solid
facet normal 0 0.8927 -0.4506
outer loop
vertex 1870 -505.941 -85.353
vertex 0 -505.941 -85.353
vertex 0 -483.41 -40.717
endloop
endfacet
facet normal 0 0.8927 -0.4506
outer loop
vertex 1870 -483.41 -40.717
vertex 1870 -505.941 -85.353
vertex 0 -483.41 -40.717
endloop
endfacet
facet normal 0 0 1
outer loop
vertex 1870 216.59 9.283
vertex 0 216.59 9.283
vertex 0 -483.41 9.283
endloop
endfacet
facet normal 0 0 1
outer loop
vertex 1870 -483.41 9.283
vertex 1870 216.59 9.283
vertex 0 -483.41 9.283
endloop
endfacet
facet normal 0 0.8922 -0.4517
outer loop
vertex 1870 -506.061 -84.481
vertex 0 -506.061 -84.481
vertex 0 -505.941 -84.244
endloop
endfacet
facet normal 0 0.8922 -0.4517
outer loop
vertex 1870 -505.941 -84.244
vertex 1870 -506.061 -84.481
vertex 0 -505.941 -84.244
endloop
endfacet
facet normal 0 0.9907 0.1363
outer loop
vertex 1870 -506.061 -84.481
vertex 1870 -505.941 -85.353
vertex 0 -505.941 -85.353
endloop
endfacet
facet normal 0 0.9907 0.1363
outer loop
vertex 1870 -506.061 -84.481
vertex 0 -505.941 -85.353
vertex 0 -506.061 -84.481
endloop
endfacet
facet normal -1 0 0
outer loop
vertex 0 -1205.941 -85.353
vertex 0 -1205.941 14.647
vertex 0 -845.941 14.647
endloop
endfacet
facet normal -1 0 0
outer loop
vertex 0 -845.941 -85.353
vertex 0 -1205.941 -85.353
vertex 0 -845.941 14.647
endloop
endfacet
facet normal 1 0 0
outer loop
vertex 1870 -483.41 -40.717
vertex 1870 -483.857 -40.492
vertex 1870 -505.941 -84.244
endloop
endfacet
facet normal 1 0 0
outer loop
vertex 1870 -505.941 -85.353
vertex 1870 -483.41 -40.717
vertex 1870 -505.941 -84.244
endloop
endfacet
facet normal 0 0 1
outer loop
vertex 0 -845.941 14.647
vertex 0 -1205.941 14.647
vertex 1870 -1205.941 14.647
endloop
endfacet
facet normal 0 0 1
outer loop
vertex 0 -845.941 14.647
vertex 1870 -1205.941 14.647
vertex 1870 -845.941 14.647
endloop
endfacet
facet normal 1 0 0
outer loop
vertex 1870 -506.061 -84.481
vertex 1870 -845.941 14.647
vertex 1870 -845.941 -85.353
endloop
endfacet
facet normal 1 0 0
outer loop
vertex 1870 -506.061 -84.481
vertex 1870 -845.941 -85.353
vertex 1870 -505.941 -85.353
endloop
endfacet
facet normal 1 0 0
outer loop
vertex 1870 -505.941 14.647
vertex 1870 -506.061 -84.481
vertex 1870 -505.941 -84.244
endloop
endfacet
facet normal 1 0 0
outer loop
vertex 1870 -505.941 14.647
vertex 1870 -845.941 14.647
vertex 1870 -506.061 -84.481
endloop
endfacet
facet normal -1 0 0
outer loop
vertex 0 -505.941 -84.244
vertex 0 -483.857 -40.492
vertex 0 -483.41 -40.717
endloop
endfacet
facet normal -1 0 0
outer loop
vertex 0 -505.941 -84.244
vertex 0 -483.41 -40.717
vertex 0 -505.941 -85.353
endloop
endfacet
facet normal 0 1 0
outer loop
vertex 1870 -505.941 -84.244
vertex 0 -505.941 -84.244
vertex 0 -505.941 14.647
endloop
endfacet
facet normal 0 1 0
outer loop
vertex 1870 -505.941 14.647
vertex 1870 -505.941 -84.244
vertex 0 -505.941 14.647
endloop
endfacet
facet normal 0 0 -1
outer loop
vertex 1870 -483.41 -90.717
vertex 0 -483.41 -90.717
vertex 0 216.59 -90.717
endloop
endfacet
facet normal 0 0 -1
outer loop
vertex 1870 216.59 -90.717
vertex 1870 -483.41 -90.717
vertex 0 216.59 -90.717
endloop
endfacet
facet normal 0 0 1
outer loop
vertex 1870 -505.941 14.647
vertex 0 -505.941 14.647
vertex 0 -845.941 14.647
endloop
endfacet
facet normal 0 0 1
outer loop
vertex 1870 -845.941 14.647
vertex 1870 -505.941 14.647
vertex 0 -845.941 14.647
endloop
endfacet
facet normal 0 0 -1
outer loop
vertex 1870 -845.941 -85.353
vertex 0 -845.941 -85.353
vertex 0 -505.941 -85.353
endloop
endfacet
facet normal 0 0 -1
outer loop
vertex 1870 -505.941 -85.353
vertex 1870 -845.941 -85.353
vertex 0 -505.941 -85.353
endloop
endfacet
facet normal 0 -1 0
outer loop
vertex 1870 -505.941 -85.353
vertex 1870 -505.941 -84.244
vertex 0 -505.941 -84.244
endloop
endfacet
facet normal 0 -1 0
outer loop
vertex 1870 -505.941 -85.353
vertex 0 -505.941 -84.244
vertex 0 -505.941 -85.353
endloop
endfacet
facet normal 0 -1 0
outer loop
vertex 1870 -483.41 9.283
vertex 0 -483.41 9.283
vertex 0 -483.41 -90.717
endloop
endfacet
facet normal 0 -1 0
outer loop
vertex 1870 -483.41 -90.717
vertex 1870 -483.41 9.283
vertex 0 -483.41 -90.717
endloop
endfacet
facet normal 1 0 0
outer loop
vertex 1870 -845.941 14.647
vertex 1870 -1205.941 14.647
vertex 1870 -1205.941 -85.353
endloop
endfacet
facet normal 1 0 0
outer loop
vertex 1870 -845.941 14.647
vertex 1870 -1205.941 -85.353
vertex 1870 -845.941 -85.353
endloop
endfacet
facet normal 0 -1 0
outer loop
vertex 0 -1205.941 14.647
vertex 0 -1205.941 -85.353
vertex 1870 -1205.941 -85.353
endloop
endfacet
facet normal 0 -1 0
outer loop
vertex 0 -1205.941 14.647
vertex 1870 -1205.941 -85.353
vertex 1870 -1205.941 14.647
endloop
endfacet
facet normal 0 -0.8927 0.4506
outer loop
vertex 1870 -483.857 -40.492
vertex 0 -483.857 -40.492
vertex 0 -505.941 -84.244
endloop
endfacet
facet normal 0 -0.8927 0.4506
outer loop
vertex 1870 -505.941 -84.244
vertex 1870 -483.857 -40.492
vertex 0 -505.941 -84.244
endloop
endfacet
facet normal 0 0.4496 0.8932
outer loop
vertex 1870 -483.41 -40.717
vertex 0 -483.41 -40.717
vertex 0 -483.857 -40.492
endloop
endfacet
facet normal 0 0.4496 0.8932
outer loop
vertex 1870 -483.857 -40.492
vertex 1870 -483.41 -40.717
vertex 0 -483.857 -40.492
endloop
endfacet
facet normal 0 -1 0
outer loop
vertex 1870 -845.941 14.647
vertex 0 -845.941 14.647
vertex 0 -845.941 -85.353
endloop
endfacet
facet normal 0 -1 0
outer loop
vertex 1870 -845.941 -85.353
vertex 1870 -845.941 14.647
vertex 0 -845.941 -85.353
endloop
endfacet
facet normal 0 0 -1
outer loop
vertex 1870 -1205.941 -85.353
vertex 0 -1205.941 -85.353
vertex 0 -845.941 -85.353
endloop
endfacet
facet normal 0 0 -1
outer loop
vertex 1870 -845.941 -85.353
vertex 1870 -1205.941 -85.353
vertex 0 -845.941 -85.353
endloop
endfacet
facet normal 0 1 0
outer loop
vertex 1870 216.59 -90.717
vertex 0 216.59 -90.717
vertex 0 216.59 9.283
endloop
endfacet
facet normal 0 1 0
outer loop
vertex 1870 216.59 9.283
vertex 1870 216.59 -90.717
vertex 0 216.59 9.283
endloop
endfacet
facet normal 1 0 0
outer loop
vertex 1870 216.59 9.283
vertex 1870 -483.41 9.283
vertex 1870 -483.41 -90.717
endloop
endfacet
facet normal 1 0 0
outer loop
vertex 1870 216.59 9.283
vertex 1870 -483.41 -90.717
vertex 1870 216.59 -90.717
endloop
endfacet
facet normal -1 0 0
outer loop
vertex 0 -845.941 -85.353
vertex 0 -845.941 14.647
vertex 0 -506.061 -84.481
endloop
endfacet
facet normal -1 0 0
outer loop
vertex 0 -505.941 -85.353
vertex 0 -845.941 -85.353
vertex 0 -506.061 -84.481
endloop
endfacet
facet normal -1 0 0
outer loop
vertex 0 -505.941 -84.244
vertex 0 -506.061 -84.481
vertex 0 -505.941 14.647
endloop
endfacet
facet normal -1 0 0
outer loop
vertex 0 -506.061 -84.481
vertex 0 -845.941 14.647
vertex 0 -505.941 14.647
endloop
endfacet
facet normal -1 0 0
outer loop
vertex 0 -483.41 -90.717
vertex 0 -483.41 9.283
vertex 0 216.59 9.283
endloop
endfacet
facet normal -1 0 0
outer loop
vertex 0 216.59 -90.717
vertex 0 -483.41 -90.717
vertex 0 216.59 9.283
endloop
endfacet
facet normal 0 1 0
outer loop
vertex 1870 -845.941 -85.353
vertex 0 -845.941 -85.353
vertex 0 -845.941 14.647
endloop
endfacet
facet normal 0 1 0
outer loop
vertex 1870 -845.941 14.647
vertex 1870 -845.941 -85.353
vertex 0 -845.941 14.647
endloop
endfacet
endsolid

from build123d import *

# Parameters (mm, degrees)
F0_W     = 360
F0_H     = 100
F1_DEPTH = 1870
F2_DEPTH = 1870
F3_DEPTH = 1870
F4_DEPTH = 1870


with BuildPart() as f1:
    # F0 (on Right) → F1 (new body)
    with BuildSketch(Plane.YZ):
        with Locations((-1025.940814, -35.353306)):
            Rectangle(F0_W, F0_H)
    extrude(amount=F1_DEPTH)


with BuildPart() as f2:
    # F0 (on Right) → F2 (new body)
    with BuildSketch(Plane.YZ):
        Polygon((-505.940814, 14.646694), (-845.940814, 14.646694), (-845.940814, -85.353306), (-505.940814, -85.353306), (-506.060747, -84.481298), (-505.940814, -84.243691), align=None)
    extrude(amount=F2_DEPTH)


with BuildPart() as f3:
    # F0 (on Right) → F3 (new body)
    with BuildSketch(Plane.YZ):
        Polygon((-483.410478, 9.282822), (-483.410478, -40.717178), (-483.410478, -90.717178), (216.589522, -90.717178), (216.589522, 9.282822), align=None)
    extrude(amount=F3_DEPTH)


with BuildPart() as f4:
    # F0 (on Right) → F4 (new body)
    with BuildSketch(Plane.YZ):
        Polygon((-505.940814, -84.243691), (-505.940814, -85.353306), (-483.410478, -40.717178), (-483.856839, -40.491875), align=None)
    extrude(amount=F4_DEPTH)


solid = Compound([f1.part, f2.part, f3.part, f4.part])
